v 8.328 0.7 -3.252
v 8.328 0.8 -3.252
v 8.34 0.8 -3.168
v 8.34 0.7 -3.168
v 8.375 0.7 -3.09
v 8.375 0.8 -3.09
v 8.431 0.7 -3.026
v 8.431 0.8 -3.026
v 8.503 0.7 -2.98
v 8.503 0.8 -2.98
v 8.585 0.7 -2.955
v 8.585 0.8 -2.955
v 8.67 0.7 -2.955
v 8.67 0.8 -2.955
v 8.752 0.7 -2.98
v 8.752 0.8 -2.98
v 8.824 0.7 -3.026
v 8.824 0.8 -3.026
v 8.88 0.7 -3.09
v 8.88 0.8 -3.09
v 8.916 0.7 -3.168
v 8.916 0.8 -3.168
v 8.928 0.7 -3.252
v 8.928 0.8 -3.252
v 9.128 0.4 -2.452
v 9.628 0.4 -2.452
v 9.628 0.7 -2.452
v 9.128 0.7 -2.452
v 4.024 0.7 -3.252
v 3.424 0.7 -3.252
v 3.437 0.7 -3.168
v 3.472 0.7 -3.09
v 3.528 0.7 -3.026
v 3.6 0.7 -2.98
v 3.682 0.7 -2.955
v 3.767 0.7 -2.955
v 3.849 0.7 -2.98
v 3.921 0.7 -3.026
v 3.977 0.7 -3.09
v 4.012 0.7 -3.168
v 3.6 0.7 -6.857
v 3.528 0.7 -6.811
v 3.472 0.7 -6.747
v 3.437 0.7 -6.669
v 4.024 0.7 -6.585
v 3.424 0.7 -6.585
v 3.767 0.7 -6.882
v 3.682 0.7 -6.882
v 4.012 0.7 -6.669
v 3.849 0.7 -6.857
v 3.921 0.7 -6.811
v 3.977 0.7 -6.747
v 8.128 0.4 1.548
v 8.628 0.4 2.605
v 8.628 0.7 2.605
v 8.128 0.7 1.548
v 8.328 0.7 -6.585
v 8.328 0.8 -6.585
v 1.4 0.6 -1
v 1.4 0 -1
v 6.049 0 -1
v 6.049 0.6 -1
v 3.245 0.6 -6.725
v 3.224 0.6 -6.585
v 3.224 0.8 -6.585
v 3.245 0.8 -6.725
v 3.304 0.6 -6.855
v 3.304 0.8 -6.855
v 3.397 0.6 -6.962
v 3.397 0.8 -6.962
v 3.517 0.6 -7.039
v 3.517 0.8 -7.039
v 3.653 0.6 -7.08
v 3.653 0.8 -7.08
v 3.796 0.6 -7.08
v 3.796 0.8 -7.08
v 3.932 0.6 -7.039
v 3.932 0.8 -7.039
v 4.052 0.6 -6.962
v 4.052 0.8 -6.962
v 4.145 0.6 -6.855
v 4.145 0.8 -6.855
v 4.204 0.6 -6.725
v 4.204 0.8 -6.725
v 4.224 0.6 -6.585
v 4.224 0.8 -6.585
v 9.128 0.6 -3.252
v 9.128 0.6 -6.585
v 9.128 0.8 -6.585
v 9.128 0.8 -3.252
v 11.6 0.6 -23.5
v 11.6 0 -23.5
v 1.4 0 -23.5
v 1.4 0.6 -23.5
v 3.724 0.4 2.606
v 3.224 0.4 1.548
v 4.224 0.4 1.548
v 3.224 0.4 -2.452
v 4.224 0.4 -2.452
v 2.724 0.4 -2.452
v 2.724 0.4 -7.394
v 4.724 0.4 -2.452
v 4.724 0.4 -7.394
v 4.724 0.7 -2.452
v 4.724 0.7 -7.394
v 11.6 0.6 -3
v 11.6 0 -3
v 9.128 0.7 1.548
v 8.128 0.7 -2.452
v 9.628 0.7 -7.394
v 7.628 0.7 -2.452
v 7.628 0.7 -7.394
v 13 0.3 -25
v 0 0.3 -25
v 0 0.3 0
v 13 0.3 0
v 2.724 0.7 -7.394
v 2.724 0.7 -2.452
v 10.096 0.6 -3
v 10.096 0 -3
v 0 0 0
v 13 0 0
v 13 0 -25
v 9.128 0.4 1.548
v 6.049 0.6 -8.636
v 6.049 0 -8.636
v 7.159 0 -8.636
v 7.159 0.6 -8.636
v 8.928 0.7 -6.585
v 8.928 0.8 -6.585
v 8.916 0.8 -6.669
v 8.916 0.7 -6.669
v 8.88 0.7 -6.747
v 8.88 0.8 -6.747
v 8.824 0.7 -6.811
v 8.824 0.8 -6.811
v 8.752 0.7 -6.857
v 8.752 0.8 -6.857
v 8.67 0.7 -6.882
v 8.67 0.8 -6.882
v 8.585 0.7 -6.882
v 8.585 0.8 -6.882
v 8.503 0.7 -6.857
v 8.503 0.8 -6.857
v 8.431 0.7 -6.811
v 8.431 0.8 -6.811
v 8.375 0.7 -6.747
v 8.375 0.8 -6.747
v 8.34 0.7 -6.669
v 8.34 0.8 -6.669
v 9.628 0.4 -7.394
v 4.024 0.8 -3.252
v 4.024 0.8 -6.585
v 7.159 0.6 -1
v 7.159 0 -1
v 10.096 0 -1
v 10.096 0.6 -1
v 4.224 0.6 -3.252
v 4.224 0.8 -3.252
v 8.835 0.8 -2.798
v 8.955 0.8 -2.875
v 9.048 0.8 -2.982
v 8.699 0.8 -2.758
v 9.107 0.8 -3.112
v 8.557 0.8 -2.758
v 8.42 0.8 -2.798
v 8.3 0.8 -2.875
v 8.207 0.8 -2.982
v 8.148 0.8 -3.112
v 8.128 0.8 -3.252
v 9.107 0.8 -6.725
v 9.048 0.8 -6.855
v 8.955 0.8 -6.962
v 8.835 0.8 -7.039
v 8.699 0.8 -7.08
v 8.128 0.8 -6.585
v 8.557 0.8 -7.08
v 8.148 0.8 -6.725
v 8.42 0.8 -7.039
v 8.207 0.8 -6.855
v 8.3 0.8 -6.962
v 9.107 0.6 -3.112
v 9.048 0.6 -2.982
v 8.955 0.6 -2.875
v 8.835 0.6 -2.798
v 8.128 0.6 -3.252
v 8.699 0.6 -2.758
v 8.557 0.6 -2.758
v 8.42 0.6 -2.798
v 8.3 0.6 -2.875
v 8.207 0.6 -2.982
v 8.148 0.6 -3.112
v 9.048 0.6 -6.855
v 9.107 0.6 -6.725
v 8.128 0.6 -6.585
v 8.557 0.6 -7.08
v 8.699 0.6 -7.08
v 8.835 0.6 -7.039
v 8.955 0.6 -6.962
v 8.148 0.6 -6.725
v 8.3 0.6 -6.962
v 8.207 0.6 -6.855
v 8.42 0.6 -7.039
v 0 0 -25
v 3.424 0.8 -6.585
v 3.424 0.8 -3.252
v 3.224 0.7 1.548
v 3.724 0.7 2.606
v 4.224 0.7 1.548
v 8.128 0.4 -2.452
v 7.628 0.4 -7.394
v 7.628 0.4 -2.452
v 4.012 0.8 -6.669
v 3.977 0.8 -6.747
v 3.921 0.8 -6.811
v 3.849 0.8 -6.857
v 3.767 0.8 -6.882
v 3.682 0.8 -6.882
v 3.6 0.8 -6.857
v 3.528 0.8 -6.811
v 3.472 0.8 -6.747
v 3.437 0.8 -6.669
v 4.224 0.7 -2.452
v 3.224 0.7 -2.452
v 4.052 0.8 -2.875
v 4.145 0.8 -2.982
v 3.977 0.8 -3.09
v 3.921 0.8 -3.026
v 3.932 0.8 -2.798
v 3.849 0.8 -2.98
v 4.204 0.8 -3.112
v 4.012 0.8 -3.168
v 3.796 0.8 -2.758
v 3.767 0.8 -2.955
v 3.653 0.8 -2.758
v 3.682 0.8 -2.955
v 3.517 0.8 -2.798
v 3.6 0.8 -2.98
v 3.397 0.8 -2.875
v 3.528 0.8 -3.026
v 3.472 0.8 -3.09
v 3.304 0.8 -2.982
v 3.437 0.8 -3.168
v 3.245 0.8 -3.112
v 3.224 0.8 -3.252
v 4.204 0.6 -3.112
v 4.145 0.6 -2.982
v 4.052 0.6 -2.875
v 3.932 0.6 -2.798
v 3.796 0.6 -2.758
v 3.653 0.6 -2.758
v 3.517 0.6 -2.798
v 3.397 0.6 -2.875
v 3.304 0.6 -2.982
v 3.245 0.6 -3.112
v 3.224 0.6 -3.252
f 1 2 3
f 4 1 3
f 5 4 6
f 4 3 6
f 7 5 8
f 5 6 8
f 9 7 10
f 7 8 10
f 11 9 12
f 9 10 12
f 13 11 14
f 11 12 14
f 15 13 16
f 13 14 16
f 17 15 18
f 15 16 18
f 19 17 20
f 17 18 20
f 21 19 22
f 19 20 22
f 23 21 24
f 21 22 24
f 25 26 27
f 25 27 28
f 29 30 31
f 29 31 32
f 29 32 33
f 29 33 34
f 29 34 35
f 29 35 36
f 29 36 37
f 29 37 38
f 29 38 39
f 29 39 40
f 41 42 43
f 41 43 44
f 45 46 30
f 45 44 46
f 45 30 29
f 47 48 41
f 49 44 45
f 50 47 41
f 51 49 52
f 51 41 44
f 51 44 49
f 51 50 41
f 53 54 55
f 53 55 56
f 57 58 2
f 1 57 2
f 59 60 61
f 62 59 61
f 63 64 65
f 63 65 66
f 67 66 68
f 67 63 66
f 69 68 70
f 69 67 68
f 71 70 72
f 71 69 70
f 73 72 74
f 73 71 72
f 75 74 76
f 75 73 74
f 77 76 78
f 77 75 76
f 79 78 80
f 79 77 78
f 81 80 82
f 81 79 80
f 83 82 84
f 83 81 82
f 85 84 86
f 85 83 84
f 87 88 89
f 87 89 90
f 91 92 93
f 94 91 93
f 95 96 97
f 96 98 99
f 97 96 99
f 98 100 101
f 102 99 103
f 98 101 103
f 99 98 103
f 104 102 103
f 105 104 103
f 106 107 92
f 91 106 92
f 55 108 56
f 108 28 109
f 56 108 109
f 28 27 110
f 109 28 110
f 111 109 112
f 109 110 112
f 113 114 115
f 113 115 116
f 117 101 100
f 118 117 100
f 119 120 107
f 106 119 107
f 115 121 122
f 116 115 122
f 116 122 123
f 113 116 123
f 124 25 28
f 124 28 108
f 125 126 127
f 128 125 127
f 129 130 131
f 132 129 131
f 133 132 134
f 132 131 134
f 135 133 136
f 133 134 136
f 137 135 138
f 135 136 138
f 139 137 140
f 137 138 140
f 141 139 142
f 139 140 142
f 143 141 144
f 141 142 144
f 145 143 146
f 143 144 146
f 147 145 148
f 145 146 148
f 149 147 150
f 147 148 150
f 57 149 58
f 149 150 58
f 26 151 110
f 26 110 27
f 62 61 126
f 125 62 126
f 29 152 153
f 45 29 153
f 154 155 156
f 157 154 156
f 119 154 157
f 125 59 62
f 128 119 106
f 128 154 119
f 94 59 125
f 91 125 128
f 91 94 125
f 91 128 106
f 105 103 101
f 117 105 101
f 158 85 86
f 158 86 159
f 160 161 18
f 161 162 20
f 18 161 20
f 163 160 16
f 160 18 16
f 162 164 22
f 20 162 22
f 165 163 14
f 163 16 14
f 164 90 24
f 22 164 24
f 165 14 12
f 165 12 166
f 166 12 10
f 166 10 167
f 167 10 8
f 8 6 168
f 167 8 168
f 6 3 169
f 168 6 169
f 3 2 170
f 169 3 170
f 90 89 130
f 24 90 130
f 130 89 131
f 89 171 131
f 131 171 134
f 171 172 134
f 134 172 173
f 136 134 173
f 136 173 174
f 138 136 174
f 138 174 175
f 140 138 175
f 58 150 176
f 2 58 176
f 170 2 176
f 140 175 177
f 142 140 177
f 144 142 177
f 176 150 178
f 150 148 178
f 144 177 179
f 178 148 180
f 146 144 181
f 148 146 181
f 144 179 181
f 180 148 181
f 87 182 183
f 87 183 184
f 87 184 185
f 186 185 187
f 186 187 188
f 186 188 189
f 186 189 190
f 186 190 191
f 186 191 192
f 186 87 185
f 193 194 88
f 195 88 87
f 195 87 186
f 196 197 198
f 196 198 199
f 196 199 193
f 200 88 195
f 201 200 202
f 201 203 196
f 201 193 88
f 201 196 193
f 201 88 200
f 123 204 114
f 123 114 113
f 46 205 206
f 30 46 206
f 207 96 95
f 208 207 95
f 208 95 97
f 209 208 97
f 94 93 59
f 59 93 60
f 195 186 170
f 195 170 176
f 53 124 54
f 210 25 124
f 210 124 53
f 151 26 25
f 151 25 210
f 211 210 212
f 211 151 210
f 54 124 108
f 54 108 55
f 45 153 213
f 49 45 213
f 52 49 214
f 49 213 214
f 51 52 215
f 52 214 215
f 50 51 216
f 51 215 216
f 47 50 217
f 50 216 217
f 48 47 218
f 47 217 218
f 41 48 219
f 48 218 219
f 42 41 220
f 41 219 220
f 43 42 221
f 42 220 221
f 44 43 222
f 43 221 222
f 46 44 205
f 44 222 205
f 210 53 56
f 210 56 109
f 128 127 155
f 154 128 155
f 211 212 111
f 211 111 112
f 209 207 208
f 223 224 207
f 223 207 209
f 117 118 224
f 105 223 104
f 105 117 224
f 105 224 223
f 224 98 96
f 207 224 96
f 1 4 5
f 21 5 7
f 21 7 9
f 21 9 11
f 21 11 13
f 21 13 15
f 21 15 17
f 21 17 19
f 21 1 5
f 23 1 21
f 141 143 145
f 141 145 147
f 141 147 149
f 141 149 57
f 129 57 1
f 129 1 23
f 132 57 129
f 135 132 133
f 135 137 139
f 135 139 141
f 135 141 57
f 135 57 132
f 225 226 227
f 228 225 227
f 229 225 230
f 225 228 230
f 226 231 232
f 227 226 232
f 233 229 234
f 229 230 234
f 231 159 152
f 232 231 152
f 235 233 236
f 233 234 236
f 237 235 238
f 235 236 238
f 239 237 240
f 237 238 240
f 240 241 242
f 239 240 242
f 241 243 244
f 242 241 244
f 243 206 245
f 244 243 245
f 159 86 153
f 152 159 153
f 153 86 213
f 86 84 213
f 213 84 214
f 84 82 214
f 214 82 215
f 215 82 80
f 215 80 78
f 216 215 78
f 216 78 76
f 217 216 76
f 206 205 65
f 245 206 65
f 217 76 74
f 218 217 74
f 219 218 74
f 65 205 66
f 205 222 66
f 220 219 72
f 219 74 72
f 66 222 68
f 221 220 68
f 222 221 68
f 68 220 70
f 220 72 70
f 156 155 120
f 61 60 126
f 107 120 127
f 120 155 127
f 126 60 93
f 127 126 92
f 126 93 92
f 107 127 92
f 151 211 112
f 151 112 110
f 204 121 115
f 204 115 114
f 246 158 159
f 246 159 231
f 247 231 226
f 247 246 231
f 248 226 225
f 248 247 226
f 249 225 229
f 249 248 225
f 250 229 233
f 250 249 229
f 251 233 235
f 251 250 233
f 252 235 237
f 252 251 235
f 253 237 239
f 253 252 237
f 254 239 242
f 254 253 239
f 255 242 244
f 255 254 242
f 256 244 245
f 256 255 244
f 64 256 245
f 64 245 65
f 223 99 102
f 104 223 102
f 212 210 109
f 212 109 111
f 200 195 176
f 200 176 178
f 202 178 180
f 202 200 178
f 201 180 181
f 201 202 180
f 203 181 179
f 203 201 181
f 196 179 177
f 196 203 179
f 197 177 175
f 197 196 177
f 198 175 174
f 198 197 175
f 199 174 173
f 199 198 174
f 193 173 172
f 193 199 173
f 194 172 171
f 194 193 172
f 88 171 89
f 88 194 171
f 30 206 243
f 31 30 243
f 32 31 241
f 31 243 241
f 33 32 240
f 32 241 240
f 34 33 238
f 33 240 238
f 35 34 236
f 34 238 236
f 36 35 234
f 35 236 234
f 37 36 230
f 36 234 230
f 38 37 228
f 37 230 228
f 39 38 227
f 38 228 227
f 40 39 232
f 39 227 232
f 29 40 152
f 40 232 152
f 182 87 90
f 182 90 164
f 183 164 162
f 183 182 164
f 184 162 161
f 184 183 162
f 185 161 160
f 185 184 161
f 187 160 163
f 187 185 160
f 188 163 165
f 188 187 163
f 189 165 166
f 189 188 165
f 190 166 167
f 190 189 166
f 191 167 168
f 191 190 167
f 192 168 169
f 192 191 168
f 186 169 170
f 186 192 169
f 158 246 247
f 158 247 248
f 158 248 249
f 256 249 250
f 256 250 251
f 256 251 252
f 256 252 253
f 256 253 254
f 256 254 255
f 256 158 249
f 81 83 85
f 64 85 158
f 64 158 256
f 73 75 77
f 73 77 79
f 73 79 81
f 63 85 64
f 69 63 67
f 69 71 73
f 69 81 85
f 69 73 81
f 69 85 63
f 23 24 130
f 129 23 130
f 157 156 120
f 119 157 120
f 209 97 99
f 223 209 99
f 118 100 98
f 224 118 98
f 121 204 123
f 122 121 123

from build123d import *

# Parameters (mm, degrees)
SKETCH1_W                   = 13
SKETCH1_H                   = 25
PLASTIC_COAT_DEPTH          = 0.3
ALUMINUM_EXTRUDE_DEPTH      = 0.3
ALUMINUM_EXTRUDE_DEPTH_BACK = 0.3
SENSOR_EXTRUDE_DEPTH        = 0.1
SENSOR_EXTRUDE_DEPTH_BACK   = 0.2
SENSOR_EXTRUDE_2_DEPTH      = 0.1
SENSOR_EXTRUDE_2_DEPTH_BACK = 0.2
BOSS_EXTRUDE6_DEPTH         = 0.1
BOSS_EXTRUDE6_DEPTH_BACK    = 0.1
BOSS_EXTRUDE6_2_DEPTH       = 0.1
BOSS_EXTRUDE6_2_DEPTH_BACK  = 0.1
CUT_EXTRUDE2_DEPTH          = 0.1
CUT_EXTRUDE3_DEPTH          = 0.1


with BuildPart() as part:
    # Sketch1 → plastic coat (new body)
    with BuildSketch(Plane(origin=(0, 0, 0), x_dir=(1, 0, 0), z_dir=(0, 1, 0))):
        with Locations((6.5, 12.5)):
            Rectangle(SKETCH1_W, SKETCH1_H)
    extrude(amount=PLASTIC_COAT_DEPTH)


with BuildPart() as body_2:
    # Sketch2 → aluminum extrude (new, two sides: drawn at the far end of the back side and taken through both)
    with BuildSketch(Plane(origin=(0, 0.3, 0), x_dir=(1, 0, 0), z_dir=(0, 1, 0)).offset(-ALUMINUM_EXTRUDE_DEPTH_BACK)):
        Polygon((1.4, 1), (6.049, 1), (6.049, 8.636), (7.159, 8.636), (7.159, 2.740696479), (7.159, 1), (10.096405054, 1), (10.096405054, 3), (11.6, 3), (11.6, 23.5), (1.4, 23.5), align=None)
    extrude(amount=ALUMINUM_EXTRUDE_DEPTH + ALUMINUM_EXTRUDE_DEPTH_BACK)


with BuildPart() as body_3:
    # Sketch3 → sensor extrude (new, two sides: drawn at the far end of the back side and taken through both)
    with BuildSketch(Plane(origin=(0, 0.6, 0), x_dir=(1, 0, 0), z_dir=(0, 1, 0)).offset(-SENSOR_EXTRUDE_DEPTH_BACK)):
        Polygon((2.7245, 7.393511148), (2.7245, 2.452413967), (3.2245, 2.452413967), (3.2245, -1.547586033), (3.7245, -2.606488852), (4.2245, -1.547586033), (4.2245, 2.452413967), (4.7245, 2.452413967), (4.7245, 7.393511148), align=None)
    extrude(amount=SENSOR_EXTRUDE_DEPTH + SENSOR_EXTRUDE_DEPTH_BACK)


with BuildPart() as body_4:
    # Sketch3 → sensor extrude 2 (new, two sides: drawn at the far end of the back side and taken through both)
    with BuildSketch(Plane(origin=(0, 0.6, 0), x_dir=(1, 0, 0), z_dir=(0, 1, 0)).offset(-SENSOR_EXTRUDE_2_DEPTH_BACK)):
        Polygon((7.627702527, 7.393511148), (9.627702527, 7.393511148), (9.627702527, 2.452413967), (9.127702527, 2.452413967), (9.127702527, -1.547586033), (8.627702527, -2.605366729), (8.127702527, -1.547586033), (8.127702527, 2.452413967), (7.627702527, 2.452413967), align=None)
    extrude(amount=SENSOR_EXTRUDE_2_DEPTH + SENSOR_EXTRUDE_2_DEPTH_BACK)


with BuildPart() as body_5:
    # Sketch4 → Boss-Extrude6 (new, two sides: drawn at the far end of the back side and taken through both)
    with BuildSketch(Plane(origin=(0, 0.7, 0), x_dir=(1, 0, 0), z_dir=(0, 1, 0)).offset(-BOSS_EXTRUDE6_DEPTH_BACK)):
        with BuildLine():
            Line((4.2245, 6.584596811), (4.2245, 3.252413967))
            ThreePointArc((4.2245, 3.252413967), (3.7245, 2.752413967), (3.2245, 3.252413967))
            Line((3.2245, 3.252413967), (3.2245, 6.584596811))
            ThreePointArc((3.2245, 6.584596811), (3.7245, 7.084596811), (4.2245, 6.584596811))
        make_face()
    extrude(amount=BOSS_EXTRUDE6_DEPTH + BOSS_EXTRUDE6_DEPTH_BACK)

    # Sketch11 → Cut-Extrude3 (cut)
    with BuildSketch(Plane(origin=(0, 0.8, 0), x_dir=(1, 0, 0), z_dir=(0, 1, 0))):
        with BuildLine():
            Line((3.4245, 6.584596811), (3.4245, 3.252413967))
            ThreePointArc((3.4245, 3.252413967), (3.7245, 2.952413967), (4.0245, 3.252413967))
            Line((4.0245, 3.252413967), (4.0245, 6.584596811))
            ThreePointArc((4.0245, 6.584596811), (3.7245, 6.884596811), (3.4245, 6.584596811))
        make_face()
    extrude(amount=-CUT_EXTRUDE3_DEPTH, mode=Mode.SUBTRACT)


with BuildPart() as body_6:
    # Sketch4 → Boss-Extrude6 2 (new, two sides: drawn at the far end of the back side and taken through both)
    with BuildSketch(Plane(origin=(0, 0.7, 0), x_dir=(1, 0, 0), z_dir=(0, 1, 0)).offset(-BOSS_EXTRUDE6_2_DEPTH_BACK)):
        with BuildLine():
            Line((9.127702527, 6.584596811), (9.127702527, 3.252413967))
            ThreePointArc((9.127702527, 3.252413967), (8.627702527, 2.752413967), (8.127702527, 3.252413967))
            Line((8.127702527, 3.252413967), (8.127702527, 6.584596811))
            ThreePointArc((8.127702527, 6.584596811), (8.627702527, 7.084596811), (9.127702527, 6.584596811))
        make_face()
    extrude(amount=BOSS_EXTRUDE6_2_DEPTH + BOSS_EXTRUDE6_2_DEPTH_BACK)

    # Sketch10 → Cut-Extrude2 (cut)
    with BuildSketch(Plane(origin=(0, 0.8, 0), x_dir=(1, 0, 0), z_dir=(0, 1, 0))):
        with BuildLine():
            Line((8.327702527, 6.584596811), (8.327702527, 3.252413967))
            ThreePointArc((8.327702527, 3.252413967), (8.627702527, 2.952413967), (8.927702527, 3.252413967))
            Line((8.927702527, 3.252413967), (8.927702527, 6.584596811))
            ThreePointArc((8.927702527, 6.584596811), (8.627702527, 6.884596811), (8.327702527, 6.584596811))
        make_face()
    extrude(amount=-CUT_EXTRUDE2_DEPTH, mode=Mode.SUBTRACT)


solid = Compound([part.part, body_2.part, body_3.part, body_4.part, body_5.part, body_6.part])
